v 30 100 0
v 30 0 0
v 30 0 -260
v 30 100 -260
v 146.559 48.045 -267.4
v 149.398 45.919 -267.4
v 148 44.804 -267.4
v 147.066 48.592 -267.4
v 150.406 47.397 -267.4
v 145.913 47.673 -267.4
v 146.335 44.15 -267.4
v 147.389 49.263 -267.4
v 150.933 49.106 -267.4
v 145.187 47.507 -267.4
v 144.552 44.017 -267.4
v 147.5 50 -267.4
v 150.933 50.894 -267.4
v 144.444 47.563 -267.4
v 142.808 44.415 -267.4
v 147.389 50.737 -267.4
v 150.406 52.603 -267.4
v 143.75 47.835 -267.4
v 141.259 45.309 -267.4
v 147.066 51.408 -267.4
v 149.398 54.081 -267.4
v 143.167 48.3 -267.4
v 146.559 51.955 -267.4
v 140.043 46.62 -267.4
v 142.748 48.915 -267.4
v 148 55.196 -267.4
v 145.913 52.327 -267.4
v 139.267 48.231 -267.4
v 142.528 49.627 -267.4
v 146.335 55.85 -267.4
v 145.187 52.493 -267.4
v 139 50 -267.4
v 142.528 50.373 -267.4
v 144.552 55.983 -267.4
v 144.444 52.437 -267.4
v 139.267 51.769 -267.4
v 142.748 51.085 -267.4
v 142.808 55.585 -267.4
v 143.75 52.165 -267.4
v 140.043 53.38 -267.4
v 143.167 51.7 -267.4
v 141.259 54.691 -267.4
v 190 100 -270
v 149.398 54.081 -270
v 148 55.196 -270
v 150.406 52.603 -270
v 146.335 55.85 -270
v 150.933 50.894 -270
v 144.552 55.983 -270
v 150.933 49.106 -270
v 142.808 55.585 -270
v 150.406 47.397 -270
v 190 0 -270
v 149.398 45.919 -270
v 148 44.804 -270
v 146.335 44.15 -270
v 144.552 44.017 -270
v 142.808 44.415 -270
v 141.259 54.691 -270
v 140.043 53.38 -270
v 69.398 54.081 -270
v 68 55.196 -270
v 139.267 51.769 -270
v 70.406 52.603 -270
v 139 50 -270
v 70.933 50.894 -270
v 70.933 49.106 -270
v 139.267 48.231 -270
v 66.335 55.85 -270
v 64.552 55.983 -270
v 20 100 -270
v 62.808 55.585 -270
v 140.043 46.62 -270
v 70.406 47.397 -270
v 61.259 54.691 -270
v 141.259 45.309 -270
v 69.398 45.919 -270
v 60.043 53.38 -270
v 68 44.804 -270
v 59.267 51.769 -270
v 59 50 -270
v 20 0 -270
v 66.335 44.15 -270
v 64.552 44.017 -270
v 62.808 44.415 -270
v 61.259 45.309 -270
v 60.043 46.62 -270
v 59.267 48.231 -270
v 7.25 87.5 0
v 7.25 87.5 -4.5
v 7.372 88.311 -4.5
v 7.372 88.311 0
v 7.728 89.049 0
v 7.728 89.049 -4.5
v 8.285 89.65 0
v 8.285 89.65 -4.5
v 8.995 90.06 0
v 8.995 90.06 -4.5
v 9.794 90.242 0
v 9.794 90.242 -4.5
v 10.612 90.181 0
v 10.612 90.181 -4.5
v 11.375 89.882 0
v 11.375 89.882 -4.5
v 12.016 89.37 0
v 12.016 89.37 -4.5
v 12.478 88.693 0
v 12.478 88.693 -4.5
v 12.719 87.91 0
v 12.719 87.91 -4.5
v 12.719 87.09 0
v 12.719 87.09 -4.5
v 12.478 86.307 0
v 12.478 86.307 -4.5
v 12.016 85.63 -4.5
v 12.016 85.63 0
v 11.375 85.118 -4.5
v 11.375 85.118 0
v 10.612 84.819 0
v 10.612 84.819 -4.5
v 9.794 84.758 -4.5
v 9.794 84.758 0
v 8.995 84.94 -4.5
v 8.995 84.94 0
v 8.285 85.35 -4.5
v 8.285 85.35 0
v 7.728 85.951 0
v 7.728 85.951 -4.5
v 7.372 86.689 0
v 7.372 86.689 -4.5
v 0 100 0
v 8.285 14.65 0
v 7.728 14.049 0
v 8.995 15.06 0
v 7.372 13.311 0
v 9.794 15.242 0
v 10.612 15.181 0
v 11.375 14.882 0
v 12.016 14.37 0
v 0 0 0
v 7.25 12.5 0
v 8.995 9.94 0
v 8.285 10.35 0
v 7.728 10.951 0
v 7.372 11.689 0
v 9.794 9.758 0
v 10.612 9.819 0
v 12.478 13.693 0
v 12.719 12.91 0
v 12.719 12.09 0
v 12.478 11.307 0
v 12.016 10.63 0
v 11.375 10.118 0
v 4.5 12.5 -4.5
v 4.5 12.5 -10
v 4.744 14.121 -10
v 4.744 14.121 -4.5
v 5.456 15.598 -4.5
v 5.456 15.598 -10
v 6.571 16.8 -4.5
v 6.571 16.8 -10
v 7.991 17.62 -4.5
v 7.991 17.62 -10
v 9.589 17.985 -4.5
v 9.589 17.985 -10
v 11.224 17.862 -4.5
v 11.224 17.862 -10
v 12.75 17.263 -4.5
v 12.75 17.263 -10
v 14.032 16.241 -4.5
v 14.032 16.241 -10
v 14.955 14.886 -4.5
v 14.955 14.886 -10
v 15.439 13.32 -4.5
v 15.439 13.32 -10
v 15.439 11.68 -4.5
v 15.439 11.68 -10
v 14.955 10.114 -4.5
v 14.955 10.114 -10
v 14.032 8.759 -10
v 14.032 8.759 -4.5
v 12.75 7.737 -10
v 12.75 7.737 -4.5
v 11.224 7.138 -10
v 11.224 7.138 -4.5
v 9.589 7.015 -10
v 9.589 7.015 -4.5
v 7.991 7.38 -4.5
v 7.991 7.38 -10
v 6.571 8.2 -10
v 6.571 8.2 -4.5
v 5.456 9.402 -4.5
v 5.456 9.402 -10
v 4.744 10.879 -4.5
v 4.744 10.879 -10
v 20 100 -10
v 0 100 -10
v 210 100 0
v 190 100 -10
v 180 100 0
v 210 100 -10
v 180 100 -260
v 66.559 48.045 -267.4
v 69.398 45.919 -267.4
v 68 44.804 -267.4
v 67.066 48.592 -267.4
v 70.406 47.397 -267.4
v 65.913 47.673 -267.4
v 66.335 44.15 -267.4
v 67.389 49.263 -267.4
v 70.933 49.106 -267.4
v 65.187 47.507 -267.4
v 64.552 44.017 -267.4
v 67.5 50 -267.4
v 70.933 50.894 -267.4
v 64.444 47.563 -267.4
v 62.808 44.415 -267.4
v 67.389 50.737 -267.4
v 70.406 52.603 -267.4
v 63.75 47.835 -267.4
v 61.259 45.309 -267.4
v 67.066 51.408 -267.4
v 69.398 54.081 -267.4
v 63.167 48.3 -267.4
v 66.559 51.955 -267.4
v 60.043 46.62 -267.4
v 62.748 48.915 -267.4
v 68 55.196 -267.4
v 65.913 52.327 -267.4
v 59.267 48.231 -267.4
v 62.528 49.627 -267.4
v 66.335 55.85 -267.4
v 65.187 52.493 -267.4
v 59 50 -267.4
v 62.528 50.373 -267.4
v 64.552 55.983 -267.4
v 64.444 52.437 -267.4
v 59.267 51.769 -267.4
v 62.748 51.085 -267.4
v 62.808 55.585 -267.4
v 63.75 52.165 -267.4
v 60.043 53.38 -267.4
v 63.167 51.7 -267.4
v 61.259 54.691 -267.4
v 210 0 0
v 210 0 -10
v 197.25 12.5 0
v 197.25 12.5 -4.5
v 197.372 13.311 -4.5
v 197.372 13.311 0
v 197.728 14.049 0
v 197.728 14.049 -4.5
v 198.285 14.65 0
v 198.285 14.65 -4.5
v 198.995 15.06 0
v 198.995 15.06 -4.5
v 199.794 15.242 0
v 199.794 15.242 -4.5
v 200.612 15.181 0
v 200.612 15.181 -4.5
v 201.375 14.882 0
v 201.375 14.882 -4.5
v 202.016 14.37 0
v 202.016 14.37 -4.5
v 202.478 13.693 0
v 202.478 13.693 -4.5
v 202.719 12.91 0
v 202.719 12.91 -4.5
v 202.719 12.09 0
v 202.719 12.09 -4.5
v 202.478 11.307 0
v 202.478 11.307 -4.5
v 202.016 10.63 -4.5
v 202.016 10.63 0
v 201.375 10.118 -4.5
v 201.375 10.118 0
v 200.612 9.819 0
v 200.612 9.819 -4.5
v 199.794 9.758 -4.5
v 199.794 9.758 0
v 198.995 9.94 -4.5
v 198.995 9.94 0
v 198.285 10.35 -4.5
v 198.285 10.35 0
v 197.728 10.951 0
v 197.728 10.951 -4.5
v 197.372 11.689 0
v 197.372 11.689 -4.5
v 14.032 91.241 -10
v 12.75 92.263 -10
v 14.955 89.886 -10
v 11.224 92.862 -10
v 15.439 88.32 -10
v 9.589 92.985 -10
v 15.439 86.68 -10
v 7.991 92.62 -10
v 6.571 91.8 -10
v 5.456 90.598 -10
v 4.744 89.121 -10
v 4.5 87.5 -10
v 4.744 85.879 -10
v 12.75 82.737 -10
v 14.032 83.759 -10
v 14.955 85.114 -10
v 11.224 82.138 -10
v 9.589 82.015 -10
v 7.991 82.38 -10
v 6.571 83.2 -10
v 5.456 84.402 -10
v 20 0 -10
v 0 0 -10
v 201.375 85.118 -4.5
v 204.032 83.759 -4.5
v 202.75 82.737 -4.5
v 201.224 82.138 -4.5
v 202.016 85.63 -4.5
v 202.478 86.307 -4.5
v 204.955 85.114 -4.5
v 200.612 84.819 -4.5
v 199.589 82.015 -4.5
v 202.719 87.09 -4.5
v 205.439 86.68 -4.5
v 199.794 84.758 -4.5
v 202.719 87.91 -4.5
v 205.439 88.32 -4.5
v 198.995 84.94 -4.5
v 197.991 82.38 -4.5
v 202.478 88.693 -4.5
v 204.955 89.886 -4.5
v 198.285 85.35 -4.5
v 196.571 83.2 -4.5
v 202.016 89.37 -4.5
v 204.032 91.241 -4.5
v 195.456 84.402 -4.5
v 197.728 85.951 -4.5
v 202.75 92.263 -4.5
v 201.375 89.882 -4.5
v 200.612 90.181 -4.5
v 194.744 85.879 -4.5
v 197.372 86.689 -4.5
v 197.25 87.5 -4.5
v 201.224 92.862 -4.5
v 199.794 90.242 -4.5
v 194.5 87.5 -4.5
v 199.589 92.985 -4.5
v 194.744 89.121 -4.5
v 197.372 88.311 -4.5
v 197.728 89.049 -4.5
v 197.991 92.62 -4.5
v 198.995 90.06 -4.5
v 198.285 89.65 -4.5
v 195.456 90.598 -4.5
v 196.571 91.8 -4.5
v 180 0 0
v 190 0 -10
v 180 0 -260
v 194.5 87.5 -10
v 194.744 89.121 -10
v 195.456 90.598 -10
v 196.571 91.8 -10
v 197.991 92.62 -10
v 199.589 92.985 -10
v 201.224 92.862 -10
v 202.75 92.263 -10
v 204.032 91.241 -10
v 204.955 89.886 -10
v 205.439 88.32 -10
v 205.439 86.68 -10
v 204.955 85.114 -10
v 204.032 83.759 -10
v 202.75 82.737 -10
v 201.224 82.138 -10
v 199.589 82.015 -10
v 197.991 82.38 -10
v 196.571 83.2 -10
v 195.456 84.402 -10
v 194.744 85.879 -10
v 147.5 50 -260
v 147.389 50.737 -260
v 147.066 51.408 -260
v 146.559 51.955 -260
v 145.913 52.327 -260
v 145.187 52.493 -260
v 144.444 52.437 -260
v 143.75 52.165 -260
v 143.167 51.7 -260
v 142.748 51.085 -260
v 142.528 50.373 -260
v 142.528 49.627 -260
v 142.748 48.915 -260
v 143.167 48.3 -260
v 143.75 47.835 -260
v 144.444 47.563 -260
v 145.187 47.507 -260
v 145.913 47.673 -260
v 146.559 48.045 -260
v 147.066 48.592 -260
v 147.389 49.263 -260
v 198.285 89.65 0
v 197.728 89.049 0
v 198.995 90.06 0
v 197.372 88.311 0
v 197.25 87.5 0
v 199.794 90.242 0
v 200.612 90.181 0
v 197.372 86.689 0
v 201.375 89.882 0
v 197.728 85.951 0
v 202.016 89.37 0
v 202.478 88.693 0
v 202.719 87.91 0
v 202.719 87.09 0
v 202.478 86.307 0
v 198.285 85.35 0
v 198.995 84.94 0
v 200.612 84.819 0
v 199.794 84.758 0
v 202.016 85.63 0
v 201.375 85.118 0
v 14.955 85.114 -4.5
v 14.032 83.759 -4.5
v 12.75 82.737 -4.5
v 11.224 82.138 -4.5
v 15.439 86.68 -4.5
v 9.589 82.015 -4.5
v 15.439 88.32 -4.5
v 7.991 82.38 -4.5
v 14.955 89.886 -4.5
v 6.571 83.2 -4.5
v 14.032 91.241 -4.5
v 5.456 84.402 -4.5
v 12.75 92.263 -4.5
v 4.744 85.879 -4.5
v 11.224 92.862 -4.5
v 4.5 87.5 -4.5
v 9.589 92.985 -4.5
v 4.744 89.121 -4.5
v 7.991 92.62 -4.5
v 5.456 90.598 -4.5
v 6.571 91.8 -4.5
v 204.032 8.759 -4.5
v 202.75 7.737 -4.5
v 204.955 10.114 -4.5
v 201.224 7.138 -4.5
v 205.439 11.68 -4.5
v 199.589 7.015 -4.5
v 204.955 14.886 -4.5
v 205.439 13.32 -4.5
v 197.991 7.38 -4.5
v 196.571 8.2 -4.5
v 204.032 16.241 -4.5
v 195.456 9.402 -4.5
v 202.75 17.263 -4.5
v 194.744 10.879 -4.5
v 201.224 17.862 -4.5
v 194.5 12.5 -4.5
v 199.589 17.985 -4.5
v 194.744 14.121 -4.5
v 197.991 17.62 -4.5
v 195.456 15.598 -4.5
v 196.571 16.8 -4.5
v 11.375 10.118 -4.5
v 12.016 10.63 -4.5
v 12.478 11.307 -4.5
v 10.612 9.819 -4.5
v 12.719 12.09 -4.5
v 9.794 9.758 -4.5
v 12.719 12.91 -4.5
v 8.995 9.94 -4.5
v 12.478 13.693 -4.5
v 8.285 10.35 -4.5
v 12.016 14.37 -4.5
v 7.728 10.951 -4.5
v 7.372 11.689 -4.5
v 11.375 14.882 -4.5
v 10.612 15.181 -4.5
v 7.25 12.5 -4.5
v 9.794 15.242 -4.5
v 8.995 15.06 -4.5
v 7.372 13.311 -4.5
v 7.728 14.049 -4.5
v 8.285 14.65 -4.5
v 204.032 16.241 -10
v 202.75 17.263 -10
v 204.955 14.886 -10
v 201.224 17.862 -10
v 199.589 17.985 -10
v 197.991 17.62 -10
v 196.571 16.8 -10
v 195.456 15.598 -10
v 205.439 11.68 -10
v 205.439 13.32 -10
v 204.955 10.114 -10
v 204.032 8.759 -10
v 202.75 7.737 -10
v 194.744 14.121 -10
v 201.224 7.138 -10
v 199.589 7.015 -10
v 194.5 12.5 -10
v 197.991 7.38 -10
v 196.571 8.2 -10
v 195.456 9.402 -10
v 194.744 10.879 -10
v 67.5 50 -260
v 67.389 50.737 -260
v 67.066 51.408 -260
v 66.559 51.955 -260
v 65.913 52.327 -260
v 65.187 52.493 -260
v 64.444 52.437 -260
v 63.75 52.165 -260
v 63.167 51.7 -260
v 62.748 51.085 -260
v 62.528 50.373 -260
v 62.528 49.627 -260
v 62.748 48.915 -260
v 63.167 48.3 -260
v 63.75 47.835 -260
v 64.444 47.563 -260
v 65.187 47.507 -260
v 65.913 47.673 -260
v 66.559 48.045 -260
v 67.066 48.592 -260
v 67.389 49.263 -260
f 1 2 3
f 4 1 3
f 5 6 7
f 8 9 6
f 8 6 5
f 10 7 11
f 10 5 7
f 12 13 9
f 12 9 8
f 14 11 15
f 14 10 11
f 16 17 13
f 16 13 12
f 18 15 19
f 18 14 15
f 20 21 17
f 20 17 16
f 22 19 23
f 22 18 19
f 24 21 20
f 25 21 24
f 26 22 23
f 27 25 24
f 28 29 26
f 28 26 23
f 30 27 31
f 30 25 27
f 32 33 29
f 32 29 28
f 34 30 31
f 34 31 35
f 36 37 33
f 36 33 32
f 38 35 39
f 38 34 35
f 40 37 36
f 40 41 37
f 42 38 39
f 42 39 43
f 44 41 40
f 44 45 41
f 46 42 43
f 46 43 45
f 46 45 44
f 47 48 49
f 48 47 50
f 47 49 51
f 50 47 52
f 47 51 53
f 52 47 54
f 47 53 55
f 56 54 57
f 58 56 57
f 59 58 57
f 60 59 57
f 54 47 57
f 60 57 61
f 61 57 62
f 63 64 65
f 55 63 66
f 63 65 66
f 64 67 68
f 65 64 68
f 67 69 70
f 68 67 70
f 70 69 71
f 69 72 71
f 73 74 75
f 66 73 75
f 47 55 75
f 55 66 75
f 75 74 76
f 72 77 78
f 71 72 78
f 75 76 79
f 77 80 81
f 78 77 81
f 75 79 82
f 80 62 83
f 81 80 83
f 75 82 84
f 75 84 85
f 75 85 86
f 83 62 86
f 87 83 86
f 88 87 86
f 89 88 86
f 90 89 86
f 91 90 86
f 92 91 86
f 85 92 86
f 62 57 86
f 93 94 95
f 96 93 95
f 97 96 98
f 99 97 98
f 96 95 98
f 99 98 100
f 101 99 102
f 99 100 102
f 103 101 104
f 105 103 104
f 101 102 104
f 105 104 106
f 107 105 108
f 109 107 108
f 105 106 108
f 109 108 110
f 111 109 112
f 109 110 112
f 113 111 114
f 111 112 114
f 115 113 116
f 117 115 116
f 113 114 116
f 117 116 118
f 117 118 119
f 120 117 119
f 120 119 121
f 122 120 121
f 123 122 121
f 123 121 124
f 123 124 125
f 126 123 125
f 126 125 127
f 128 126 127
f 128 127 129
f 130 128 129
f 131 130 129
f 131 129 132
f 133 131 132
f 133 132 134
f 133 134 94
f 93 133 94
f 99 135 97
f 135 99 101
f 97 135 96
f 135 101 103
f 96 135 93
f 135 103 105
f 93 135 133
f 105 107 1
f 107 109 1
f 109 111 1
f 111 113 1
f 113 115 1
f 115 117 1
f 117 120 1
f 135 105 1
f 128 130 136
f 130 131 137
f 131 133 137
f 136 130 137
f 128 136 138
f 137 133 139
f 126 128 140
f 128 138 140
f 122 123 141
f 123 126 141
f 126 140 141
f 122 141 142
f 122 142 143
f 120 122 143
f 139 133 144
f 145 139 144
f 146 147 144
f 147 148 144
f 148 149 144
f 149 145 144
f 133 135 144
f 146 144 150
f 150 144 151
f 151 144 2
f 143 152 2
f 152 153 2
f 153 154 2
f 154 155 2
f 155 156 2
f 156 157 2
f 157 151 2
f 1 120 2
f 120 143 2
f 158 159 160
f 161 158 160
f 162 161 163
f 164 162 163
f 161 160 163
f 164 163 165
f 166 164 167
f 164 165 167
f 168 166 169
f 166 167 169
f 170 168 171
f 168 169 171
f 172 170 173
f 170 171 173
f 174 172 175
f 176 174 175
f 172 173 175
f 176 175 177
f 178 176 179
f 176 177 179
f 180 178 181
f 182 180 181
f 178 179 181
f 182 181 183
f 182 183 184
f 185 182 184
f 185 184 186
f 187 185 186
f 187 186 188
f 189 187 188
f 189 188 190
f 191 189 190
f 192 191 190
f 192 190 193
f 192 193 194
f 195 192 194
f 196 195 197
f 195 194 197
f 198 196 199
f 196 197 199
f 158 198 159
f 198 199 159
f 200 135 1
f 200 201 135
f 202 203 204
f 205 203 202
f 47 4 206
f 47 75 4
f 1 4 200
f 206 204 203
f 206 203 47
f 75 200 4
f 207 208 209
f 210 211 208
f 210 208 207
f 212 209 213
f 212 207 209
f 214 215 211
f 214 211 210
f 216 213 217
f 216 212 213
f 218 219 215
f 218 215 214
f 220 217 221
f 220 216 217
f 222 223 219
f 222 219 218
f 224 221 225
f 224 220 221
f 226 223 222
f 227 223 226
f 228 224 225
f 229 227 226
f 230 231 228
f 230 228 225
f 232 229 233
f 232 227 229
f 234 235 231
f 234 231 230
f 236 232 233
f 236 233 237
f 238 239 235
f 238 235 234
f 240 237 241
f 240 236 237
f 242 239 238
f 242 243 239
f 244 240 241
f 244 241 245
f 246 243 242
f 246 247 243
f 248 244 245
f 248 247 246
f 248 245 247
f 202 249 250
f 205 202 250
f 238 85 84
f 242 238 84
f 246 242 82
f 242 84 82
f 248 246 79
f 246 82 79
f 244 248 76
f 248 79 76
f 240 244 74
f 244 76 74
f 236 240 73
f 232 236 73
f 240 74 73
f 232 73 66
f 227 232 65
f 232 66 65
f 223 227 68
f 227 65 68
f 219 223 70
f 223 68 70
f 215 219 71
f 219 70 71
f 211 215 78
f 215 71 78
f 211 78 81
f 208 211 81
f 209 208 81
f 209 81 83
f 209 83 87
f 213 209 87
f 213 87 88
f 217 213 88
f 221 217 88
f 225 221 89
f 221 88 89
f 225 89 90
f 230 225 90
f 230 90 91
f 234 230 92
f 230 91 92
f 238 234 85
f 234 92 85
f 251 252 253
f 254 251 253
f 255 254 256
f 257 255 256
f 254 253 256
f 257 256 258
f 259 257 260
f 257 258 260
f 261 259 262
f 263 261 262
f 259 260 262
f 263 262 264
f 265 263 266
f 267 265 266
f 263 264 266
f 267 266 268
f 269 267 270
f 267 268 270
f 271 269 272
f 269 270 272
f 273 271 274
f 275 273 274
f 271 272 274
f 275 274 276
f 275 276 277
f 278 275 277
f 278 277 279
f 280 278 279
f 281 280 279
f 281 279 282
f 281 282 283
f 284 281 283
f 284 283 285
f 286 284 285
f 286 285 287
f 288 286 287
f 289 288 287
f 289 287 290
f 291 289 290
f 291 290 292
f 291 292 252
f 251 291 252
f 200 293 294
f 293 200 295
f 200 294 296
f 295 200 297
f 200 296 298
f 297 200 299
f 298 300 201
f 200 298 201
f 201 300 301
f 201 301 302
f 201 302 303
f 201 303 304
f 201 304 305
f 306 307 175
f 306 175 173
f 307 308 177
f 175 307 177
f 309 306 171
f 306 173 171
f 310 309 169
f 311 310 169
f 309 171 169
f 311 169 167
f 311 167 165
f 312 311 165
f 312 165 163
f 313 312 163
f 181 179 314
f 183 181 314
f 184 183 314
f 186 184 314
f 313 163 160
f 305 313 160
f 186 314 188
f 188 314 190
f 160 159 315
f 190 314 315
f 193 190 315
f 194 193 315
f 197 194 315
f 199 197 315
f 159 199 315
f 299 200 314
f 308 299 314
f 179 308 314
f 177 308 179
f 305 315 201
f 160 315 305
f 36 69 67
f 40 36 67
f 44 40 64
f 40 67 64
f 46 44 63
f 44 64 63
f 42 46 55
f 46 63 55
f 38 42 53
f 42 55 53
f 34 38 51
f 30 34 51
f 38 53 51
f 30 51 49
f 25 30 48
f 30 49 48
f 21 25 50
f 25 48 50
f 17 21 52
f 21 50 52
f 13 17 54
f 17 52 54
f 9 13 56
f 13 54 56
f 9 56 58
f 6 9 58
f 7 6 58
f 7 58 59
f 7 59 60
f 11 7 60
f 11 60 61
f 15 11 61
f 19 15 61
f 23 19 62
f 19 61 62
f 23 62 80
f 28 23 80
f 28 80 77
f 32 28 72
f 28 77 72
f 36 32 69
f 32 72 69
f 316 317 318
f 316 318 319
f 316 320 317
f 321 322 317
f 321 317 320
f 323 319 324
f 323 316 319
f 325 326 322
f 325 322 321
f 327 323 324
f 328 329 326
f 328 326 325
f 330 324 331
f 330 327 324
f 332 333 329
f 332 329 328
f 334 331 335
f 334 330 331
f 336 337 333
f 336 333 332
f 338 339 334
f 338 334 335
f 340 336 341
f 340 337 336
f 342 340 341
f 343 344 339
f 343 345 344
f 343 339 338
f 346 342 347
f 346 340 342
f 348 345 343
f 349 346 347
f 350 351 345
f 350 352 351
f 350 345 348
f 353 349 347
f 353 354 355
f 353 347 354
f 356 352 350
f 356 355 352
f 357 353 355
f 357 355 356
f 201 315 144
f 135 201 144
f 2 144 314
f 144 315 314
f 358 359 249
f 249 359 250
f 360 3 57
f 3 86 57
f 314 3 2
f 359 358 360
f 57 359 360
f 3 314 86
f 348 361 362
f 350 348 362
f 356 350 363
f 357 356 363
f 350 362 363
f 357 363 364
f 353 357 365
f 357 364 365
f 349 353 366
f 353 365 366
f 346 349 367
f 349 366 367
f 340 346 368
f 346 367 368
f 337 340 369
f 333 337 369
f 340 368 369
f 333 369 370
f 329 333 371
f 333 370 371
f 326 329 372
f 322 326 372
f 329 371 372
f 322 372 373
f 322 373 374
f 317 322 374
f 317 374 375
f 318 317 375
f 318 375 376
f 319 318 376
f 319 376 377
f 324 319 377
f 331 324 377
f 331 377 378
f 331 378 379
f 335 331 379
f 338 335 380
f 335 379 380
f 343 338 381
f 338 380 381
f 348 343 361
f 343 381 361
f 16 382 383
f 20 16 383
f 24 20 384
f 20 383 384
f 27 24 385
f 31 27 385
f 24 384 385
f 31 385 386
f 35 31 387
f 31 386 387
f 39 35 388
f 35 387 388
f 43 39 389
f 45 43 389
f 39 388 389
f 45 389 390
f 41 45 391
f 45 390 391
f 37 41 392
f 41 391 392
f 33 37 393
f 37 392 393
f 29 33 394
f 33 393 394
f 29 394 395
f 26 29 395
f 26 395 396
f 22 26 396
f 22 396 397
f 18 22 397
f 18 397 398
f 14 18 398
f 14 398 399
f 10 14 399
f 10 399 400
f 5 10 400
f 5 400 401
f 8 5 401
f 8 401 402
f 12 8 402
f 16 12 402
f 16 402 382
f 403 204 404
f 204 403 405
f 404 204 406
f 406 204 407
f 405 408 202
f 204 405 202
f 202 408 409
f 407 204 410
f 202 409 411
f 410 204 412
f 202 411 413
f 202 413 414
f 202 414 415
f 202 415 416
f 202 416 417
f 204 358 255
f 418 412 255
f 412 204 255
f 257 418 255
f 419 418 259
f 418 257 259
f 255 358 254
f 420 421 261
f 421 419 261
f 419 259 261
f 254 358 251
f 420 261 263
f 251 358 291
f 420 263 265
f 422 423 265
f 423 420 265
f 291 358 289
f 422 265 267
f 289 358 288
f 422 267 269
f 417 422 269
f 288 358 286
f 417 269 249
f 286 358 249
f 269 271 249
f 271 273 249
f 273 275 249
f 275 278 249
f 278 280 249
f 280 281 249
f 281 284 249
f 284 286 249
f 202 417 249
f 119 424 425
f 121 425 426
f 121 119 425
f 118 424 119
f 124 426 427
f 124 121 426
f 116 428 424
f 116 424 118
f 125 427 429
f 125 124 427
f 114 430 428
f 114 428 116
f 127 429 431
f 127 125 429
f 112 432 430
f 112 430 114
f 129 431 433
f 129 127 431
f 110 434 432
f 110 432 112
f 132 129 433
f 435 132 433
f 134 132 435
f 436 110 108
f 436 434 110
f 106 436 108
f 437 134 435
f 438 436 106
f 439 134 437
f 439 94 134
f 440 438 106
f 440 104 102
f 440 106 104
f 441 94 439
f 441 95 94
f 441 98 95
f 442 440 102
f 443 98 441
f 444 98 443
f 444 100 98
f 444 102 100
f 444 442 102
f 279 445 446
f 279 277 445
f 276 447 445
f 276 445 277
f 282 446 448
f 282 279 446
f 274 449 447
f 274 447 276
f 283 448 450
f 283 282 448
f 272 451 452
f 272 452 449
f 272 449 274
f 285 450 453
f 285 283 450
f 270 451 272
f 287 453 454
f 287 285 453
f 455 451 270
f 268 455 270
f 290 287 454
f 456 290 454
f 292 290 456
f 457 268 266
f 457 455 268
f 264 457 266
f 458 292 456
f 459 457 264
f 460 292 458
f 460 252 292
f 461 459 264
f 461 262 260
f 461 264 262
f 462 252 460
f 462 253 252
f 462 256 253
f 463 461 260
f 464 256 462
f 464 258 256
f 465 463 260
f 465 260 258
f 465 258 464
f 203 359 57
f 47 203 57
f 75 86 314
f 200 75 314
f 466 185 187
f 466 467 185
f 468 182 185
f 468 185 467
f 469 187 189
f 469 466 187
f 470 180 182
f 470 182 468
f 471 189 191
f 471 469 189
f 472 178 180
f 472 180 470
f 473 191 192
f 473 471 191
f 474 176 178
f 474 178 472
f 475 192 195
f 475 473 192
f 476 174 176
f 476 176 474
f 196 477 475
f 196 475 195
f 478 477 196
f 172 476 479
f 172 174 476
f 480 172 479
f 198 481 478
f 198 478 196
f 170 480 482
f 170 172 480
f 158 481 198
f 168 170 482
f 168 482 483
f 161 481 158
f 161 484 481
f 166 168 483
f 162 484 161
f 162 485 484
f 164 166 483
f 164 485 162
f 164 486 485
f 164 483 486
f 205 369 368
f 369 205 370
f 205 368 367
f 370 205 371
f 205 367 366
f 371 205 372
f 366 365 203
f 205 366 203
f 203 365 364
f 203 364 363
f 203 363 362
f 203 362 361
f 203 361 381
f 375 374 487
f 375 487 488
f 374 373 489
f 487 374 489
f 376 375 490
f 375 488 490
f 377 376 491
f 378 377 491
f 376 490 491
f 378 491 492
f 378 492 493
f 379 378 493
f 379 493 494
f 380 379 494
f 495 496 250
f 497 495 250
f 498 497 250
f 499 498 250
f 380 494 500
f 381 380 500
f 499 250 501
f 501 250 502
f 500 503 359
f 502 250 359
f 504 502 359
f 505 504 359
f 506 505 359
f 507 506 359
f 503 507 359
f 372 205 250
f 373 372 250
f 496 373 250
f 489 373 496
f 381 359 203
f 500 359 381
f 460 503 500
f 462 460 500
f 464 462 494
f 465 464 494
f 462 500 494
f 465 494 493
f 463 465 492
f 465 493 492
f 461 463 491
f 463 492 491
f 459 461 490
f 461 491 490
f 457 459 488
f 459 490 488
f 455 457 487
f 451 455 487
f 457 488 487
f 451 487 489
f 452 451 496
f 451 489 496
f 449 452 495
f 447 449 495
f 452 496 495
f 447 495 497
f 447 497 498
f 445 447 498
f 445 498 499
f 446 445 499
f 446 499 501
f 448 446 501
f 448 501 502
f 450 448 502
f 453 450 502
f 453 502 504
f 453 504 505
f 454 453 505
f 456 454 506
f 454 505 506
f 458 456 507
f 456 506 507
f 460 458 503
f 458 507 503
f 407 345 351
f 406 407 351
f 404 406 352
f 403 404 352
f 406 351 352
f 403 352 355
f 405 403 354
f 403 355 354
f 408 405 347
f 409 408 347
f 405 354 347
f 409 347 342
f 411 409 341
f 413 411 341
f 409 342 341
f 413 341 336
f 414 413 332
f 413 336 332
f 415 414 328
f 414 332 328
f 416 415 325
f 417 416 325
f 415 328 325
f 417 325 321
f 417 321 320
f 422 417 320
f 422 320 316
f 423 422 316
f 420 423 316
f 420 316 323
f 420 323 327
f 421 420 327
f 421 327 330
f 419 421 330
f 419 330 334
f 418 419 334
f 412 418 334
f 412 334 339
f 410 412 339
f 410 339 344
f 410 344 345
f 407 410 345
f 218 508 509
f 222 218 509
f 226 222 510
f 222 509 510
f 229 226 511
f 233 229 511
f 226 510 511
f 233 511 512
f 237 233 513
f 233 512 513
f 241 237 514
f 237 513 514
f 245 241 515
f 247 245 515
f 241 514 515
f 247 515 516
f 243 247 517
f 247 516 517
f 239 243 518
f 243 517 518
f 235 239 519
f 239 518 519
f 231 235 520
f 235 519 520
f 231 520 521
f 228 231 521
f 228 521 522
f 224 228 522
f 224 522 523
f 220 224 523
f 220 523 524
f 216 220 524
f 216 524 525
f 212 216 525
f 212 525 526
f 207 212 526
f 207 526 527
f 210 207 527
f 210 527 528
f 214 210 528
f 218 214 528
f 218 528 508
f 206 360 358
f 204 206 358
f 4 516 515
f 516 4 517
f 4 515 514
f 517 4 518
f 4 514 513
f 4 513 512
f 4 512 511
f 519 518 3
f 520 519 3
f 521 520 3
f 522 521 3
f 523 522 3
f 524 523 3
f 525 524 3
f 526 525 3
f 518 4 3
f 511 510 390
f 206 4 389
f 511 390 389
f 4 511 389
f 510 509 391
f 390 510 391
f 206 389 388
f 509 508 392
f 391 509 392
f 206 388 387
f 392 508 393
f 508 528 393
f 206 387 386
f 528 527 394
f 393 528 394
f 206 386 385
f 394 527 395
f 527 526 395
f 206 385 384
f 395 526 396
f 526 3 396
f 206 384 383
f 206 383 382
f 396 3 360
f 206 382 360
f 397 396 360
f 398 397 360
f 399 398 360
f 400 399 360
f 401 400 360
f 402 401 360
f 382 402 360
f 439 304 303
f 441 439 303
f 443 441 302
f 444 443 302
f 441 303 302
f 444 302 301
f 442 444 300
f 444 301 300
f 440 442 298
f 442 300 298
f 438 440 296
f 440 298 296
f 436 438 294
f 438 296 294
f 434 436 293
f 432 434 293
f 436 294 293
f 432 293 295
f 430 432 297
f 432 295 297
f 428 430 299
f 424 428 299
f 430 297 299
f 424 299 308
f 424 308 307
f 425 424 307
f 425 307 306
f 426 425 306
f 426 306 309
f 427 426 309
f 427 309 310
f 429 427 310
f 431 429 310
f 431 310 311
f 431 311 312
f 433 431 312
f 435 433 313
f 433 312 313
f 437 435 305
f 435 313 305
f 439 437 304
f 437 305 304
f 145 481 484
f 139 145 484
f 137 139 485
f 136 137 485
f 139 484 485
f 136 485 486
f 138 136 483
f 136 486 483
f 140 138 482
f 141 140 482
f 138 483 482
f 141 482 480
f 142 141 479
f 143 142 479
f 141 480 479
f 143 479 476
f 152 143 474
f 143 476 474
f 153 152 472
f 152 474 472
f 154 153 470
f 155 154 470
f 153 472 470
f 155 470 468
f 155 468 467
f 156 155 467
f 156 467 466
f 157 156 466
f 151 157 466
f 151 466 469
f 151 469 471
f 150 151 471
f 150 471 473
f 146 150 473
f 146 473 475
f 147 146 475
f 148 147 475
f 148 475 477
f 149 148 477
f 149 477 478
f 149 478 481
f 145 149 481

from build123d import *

# Parameters (mm, degrees)
BOSS_EXTRUDE1_DEPTH   = 100
M6_TAPPED_HOLE2_D     = 5
M6_TAPPED_HOLE2_DEPTH = 13.497848452
M6_TAPPED_HOLE2_TIP   = 1.502151548
SKETCH9_R             = 6
CUT_EXTRUDE2_DEPTH    = 2.6
SKETCH10_R            = 2.75
CUT_EXTRUDE3_DEPTH    = 11
SKETCH11_R            = 5.5
CUT_EXTRUDE4_DEPTH    = 5.5


with BuildPart() as part:
    # Sketch1 → Boss-Extrude1 (new body)
    with BuildSketch(Plane(origin=(0, 0, 0), x_dir=(1, 0, 0), z_dir=(0, 1, 0))):
        Polygon((0, 0), (30, 0), (30, 260), (180, 260), (180, 0), (210, 0), (210, 10), (190, 10), (190, 270), (20, 270), (20, 10), (0, 10), align=None)
    extrude(amount=BOSS_EXTRUDE1_DEPTH)

    # M6 Tapped Hole2
    with Locations(Plane(origin=(0, 0, -270), x_dir=(-1, 0, 0), z_dir=(0, 0, -1))):
        with Locations((-145, 50), (-65, 50)):
            Hole(M6_TAPPED_HOLE2_D / 2, depth=M6_TAPPED_HOLE2_DEPTH)
            with Locations((0, 0, -(M6_TAPPED_HOLE2_DEPTH + M6_TAPPED_HOLE2_TIP / 2))):  # 118° drill point
                Cone(0, M6_TAPPED_HOLE2_D / 2, M6_TAPPED_HOLE2_TIP, mode=Mode.SUBTRACT)

    # Sketch9 → Cut-Extrude2 (cut)
    with BuildSketch(Plane(origin=(0, 0, -270), x_dir=(-1, 0, 0), z_dir=(0, 0, -1))):
        with Locations((-145, 50)):
            Circle(SKETCH9_R)
        with Locations((-65, 50)):
            Circle(SKETCH9_R)
    extrude(amount=-CUT_EXTRUDE2_DEPTH, mode=Mode.SUBTRACT)

    # Sketch10 → Cut-Extrude3 (cut, through all)
    with BuildSketch(Plane(origin=(0, 0, -10), x_dir=(-1, 0, 0), z_dir=(0, 0, -1))):
        with Locations((-10, 87.5)):
            Circle(SKETCH10_R)
        with Locations((-10, 12.5)):
            Circle(SKETCH10_R)
        with Locations((-200, 12.5)):
            Circle(SKETCH10_R)
        with Locations((-200, 87.5)):
            Circle(SKETCH10_R)
    extrude(amount=-CUT_EXTRUDE3_DEPTH, mode=Mode.SUBTRACT)

    # Sketch11 → Cut-Extrude4 (cut)
    with BuildSketch(Plane(origin=(0, 0, -10), x_dir=(-1, 0, 0), z_dir=(0, 0, -1))):
        with Locations((-10, 87.5)):
            Circle(SKETCH11_R)
        with Locations((-10, 12.5)):
            Circle(SKETCH11_R)
        with Locations((-200, 12.5)):
            Circle(SKETCH11_R)
        with Locations((-200, 87.5)):
            Circle(SKETCH11_R)
    extrude(amount=-CUT_EXTRUDE4_DEPTH, mode=Mode.SUBTRACT)


solid = part.part
